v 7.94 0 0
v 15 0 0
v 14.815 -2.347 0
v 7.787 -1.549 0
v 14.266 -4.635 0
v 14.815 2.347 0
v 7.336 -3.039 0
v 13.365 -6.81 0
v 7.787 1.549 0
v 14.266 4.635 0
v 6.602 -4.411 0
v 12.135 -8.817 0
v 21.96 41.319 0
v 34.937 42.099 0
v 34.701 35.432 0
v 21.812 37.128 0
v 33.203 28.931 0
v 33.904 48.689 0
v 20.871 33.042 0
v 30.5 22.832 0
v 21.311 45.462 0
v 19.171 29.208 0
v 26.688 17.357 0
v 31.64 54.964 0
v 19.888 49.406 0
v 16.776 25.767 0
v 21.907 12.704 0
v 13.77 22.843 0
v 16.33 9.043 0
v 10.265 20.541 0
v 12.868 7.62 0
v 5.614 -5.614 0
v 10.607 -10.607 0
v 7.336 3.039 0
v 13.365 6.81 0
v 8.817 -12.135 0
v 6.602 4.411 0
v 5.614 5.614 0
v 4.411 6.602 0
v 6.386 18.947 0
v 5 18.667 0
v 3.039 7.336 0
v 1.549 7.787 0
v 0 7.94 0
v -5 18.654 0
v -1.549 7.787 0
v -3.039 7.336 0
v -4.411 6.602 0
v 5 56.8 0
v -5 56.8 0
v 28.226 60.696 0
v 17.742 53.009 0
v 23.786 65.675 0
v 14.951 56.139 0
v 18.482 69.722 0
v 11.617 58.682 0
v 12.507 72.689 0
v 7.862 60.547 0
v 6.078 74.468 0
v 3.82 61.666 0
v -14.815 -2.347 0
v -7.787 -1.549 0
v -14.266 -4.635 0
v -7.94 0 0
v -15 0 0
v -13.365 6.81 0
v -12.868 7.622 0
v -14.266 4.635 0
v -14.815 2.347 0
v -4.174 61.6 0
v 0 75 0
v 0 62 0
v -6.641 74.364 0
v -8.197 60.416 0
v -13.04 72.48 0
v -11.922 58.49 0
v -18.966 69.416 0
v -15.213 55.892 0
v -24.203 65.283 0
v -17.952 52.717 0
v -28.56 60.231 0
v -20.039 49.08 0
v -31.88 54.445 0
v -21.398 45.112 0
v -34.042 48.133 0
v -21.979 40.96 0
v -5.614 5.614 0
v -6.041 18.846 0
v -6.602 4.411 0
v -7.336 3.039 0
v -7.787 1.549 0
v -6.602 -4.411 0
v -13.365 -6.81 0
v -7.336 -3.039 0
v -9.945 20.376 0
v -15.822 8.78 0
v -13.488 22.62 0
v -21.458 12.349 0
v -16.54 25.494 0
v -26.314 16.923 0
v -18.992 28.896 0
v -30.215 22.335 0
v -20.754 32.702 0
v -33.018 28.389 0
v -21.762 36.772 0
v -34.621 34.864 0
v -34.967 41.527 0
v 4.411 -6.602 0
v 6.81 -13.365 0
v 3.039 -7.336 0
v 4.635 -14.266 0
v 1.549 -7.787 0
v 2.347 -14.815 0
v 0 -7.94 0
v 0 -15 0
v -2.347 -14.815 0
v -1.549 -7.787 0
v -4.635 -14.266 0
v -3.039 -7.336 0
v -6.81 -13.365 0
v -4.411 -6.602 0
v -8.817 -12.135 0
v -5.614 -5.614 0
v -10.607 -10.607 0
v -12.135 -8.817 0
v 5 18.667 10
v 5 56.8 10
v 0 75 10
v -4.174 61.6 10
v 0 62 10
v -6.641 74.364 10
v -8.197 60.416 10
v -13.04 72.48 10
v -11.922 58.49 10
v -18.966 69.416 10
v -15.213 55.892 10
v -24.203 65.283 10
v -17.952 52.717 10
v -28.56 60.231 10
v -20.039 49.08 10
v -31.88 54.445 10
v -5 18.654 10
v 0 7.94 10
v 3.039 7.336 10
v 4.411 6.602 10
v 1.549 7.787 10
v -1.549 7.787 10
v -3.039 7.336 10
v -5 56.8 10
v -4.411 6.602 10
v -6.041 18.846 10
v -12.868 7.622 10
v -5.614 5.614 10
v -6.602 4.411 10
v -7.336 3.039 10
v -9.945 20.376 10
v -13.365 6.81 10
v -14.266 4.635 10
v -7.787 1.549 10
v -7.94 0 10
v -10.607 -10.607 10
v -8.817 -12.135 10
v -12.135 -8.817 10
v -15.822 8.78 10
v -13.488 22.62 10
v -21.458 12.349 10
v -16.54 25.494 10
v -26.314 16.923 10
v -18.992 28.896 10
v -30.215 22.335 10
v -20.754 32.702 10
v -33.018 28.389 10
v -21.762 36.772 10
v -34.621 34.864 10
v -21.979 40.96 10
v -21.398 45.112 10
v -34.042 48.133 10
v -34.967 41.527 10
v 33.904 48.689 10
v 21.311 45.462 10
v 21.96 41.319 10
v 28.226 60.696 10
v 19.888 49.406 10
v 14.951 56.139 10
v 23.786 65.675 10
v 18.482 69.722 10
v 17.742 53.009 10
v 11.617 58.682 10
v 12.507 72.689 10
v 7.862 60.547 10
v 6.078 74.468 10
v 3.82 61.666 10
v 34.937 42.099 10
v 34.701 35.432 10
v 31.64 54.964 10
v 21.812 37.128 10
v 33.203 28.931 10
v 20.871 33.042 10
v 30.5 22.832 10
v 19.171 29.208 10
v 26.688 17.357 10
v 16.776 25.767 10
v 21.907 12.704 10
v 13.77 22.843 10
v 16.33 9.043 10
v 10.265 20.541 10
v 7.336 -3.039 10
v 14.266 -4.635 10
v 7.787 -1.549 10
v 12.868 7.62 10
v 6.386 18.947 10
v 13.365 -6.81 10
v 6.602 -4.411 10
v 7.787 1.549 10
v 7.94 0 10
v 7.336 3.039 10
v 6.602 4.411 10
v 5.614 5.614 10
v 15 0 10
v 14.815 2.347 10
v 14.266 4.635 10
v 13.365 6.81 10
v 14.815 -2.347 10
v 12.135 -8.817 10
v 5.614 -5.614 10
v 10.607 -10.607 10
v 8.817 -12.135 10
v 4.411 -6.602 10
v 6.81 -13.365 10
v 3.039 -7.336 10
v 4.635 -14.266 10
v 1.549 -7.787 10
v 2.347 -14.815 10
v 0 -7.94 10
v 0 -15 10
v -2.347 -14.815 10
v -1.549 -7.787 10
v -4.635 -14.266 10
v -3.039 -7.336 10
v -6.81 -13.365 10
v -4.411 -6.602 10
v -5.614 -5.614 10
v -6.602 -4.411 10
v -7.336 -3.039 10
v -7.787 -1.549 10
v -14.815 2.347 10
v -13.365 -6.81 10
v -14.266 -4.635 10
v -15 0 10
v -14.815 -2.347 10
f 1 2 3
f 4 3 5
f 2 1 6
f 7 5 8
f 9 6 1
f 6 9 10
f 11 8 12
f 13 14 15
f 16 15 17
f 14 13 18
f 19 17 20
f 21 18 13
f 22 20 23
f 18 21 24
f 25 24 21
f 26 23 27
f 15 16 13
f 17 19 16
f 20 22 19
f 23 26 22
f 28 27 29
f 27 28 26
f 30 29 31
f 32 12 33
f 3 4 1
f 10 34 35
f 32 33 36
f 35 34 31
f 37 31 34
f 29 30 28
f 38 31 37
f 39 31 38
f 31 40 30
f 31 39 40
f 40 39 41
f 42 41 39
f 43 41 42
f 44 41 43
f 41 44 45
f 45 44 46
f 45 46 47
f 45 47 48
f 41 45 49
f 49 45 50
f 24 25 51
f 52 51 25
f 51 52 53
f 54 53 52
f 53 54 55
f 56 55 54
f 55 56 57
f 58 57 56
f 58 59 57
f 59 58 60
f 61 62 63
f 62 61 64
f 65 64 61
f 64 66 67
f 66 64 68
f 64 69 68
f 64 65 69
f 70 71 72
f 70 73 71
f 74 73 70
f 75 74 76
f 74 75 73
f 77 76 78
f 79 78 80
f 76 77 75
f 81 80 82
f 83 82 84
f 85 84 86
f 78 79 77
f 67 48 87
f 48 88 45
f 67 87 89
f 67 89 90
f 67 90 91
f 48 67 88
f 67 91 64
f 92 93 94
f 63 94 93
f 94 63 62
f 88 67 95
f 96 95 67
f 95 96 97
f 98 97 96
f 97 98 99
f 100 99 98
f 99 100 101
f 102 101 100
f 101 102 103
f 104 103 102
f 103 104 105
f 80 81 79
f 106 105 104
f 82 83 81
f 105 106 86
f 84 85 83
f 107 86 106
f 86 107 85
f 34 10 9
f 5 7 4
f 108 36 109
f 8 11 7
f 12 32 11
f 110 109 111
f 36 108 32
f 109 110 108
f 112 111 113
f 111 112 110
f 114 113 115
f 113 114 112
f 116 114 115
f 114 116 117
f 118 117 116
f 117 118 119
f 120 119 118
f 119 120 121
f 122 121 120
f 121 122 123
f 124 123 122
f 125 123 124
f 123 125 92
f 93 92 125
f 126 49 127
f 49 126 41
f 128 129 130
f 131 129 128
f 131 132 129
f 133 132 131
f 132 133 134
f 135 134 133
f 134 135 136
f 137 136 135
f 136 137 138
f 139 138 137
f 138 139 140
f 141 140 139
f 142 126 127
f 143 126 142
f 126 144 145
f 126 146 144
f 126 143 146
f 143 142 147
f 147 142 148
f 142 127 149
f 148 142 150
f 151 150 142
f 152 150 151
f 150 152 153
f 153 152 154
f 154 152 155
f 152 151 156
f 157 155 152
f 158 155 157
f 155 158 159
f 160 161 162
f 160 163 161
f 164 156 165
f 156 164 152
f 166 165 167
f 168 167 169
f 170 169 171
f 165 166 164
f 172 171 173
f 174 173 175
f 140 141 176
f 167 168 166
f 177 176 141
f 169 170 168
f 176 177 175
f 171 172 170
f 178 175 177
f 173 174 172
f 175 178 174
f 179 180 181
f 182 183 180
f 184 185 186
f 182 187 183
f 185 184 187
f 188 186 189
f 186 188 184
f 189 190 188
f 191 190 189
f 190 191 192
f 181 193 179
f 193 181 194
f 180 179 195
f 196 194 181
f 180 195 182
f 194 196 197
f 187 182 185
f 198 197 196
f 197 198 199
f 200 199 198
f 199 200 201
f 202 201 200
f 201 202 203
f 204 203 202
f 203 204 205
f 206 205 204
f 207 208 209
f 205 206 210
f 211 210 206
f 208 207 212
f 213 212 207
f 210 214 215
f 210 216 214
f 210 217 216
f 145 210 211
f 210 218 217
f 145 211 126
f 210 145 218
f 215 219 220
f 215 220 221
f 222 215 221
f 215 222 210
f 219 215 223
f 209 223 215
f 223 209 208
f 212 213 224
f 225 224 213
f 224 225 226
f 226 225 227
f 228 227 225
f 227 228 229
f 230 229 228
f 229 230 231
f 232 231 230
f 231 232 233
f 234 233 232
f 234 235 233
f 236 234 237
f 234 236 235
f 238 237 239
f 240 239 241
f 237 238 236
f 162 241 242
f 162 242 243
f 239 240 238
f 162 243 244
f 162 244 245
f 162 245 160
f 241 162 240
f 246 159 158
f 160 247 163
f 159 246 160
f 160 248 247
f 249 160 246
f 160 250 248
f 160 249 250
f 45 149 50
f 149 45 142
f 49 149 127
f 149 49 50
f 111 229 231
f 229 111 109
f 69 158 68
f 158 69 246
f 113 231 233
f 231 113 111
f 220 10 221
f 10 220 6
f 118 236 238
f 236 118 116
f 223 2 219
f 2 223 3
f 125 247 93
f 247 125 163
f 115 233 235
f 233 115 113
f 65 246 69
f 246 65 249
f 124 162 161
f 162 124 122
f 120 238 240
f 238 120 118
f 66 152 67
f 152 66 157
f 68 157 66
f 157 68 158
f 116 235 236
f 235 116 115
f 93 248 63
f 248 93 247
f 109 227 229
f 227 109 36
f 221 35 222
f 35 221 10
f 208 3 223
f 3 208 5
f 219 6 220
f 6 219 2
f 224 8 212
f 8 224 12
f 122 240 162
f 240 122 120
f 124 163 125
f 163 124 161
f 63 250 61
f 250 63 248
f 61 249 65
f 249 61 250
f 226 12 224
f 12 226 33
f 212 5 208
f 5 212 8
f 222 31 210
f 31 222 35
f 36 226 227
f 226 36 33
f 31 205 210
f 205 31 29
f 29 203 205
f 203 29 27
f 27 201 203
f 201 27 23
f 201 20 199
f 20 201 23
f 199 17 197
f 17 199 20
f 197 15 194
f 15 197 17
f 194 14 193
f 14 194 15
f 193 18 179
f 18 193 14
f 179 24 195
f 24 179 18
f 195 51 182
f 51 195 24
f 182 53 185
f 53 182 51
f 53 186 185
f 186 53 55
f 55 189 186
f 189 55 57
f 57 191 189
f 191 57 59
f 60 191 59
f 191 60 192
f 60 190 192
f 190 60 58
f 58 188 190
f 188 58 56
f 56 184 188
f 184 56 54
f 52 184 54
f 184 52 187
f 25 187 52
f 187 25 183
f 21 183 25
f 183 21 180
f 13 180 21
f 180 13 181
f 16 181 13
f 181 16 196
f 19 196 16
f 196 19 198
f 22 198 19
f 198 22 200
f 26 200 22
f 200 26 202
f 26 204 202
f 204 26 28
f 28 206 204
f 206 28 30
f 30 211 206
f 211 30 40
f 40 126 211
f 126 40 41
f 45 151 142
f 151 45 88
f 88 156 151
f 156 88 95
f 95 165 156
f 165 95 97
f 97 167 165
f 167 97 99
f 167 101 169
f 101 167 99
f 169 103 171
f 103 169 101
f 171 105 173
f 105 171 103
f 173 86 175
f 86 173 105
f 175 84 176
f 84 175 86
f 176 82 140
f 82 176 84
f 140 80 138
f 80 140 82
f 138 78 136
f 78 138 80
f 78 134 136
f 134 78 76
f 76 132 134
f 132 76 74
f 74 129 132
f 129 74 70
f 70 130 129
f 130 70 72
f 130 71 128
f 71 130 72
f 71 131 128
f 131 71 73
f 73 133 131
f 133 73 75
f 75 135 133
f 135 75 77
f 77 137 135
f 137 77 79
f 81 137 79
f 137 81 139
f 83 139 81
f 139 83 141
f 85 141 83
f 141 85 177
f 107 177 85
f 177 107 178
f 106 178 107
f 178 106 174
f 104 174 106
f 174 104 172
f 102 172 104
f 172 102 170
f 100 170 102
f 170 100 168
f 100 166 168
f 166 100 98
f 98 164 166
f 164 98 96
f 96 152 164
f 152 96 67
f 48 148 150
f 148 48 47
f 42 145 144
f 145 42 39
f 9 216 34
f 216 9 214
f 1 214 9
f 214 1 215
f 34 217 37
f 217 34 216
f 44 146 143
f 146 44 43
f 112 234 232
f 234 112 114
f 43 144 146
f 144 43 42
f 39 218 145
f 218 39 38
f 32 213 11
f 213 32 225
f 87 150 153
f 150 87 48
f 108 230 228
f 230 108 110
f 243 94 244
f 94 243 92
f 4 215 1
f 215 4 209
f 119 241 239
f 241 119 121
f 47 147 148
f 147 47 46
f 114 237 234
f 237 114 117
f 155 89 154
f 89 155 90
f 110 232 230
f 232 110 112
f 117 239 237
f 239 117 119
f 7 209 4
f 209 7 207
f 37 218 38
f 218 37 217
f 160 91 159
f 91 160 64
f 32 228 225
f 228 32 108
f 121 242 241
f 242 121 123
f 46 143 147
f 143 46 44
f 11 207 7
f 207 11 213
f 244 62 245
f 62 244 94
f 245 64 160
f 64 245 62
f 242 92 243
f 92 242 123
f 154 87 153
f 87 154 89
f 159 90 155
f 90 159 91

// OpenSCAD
$fn = 32;

// ----------------------------------------------------------------------
// Hook: 80 mm shank into a 22 mm curl, 10 mm thick
// ----------------------------------------------------------------------

// --- parameters (mm) ---
shank_len = 80;           // shank length from the boss centre
shank_w = 10;             // shank width
boss_d = 30;              // boss diameter
bore_d = 15.88;           // boss bore
curl_in = 22;             // curl inner radius
curl_out = 35;            // curl outer radius
curl_sweep = 350;         // curl sweep angle
hook_t = 10;              // hook thickness

shank_profile = [[-5, 56.8], [5, 56.8], [5, 13], [-5, 13]];
boss_profile = [[15, 0], [14.815, 2.347], [14.266, 4.635], [13.365, 6.81], [12.135, 8.817], [10.607, 10.607], [8.817, 12.135], [6.81, 13.365], [4.635, 14.266], [2.347, 14.815], [0, 15], [-2.347, 14.815], [-4.635, 14.266], [-6.81, 13.365], [-8.817, 12.135], [-10.607, 10.607], [-12.135, 8.817], [-13.365, 6.81], [-14.266, 4.635], [-14.815, 2.347], [-15, 0], [-14.815, -2.347], [-14.266, -4.635], [-13.365, -6.81], [-12.135, -8.817], [-10.607, -10.607], [-8.817, -12.135], [-6.81, -13.365], [-4.635, -14.266], [-2.347, -14.815], [0, -15], [2.347, -14.815], [4.635, -14.266], [6.81, -13.365], [8.817, -12.135], [10.607, -10.607], [12.135, -8.817], [13.365, -6.81], [14.266, -4.635], [14.815, -2.347]];
curl_profile = [[0, 75], [-6.641, 74.364], [-13.04, 72.48], [-18.966, 69.416], [-24.203, 65.283], [-28.56, 60.231], [-31.88, 54.445], [-34.042, 48.133], [-34.967, 41.527], [-34.621, 34.864], [-33.018, 28.389], [-30.215, 22.335], [-26.314, 16.923], [-21.458, 12.349], [-15.822, 8.78], [-9.611, 6.345], [-3.05, 5.133], [3.621, 5.188], [10.16, 6.507], [16.33, 9.043], [21.907, 12.704], [26.688, 17.357], [30.5, 22.832], [33.203, 28.931], [34.701, 35.432], [34.937, 42.099], [33.904, 48.689], [31.64, 54.964], [28.226, 60.696], [23.786, 65.675], [18.482, 69.722], [12.507, 72.689], [6.078, 74.468], [3.82, 61.666], [7.862, 60.547], [11.617, 58.682], [14.951, 56.139], [17.742, 53.009], [19.888, 49.406], [21.311, 45.462], [21.96, 41.319], [21.812, 37.128], [20.871, 33.042], [19.171, 29.208], [16.776, 25.767], [13.77, 22.843], [10.265, 20.541], [6.386, 18.947], [2.276, 18.118], [-1.917, 18.084], [-6.041, 18.846], [-9.945, 20.376], [-13.488, 22.62], [-16.54, 25.494], [-18.992, 28.896], [-20.754, 32.702], [-21.762, 36.772], [-21.979, 40.96], [-21.398, 45.112], [-20.039, 49.08], [-17.952, 52.717], [-15.213, 55.892], [-11.922, 58.49], [-8.197, 60.416], [-4.174, 61.6], [0, 62]];

difference() {
  union() {
    /* three overlapping outlines: shank, boss and the smooth curl */
    linear_extrude(height = hook_t) polygon(shank_profile);
    linear_extrude(height = hook_t) polygon(boss_profile);
    linear_extrude(height = hook_t) polygon(curl_profile);
  }
  translate([0, 0, -2.5]) cylinder(h = hook_t + 5, d = bore_d);
}
